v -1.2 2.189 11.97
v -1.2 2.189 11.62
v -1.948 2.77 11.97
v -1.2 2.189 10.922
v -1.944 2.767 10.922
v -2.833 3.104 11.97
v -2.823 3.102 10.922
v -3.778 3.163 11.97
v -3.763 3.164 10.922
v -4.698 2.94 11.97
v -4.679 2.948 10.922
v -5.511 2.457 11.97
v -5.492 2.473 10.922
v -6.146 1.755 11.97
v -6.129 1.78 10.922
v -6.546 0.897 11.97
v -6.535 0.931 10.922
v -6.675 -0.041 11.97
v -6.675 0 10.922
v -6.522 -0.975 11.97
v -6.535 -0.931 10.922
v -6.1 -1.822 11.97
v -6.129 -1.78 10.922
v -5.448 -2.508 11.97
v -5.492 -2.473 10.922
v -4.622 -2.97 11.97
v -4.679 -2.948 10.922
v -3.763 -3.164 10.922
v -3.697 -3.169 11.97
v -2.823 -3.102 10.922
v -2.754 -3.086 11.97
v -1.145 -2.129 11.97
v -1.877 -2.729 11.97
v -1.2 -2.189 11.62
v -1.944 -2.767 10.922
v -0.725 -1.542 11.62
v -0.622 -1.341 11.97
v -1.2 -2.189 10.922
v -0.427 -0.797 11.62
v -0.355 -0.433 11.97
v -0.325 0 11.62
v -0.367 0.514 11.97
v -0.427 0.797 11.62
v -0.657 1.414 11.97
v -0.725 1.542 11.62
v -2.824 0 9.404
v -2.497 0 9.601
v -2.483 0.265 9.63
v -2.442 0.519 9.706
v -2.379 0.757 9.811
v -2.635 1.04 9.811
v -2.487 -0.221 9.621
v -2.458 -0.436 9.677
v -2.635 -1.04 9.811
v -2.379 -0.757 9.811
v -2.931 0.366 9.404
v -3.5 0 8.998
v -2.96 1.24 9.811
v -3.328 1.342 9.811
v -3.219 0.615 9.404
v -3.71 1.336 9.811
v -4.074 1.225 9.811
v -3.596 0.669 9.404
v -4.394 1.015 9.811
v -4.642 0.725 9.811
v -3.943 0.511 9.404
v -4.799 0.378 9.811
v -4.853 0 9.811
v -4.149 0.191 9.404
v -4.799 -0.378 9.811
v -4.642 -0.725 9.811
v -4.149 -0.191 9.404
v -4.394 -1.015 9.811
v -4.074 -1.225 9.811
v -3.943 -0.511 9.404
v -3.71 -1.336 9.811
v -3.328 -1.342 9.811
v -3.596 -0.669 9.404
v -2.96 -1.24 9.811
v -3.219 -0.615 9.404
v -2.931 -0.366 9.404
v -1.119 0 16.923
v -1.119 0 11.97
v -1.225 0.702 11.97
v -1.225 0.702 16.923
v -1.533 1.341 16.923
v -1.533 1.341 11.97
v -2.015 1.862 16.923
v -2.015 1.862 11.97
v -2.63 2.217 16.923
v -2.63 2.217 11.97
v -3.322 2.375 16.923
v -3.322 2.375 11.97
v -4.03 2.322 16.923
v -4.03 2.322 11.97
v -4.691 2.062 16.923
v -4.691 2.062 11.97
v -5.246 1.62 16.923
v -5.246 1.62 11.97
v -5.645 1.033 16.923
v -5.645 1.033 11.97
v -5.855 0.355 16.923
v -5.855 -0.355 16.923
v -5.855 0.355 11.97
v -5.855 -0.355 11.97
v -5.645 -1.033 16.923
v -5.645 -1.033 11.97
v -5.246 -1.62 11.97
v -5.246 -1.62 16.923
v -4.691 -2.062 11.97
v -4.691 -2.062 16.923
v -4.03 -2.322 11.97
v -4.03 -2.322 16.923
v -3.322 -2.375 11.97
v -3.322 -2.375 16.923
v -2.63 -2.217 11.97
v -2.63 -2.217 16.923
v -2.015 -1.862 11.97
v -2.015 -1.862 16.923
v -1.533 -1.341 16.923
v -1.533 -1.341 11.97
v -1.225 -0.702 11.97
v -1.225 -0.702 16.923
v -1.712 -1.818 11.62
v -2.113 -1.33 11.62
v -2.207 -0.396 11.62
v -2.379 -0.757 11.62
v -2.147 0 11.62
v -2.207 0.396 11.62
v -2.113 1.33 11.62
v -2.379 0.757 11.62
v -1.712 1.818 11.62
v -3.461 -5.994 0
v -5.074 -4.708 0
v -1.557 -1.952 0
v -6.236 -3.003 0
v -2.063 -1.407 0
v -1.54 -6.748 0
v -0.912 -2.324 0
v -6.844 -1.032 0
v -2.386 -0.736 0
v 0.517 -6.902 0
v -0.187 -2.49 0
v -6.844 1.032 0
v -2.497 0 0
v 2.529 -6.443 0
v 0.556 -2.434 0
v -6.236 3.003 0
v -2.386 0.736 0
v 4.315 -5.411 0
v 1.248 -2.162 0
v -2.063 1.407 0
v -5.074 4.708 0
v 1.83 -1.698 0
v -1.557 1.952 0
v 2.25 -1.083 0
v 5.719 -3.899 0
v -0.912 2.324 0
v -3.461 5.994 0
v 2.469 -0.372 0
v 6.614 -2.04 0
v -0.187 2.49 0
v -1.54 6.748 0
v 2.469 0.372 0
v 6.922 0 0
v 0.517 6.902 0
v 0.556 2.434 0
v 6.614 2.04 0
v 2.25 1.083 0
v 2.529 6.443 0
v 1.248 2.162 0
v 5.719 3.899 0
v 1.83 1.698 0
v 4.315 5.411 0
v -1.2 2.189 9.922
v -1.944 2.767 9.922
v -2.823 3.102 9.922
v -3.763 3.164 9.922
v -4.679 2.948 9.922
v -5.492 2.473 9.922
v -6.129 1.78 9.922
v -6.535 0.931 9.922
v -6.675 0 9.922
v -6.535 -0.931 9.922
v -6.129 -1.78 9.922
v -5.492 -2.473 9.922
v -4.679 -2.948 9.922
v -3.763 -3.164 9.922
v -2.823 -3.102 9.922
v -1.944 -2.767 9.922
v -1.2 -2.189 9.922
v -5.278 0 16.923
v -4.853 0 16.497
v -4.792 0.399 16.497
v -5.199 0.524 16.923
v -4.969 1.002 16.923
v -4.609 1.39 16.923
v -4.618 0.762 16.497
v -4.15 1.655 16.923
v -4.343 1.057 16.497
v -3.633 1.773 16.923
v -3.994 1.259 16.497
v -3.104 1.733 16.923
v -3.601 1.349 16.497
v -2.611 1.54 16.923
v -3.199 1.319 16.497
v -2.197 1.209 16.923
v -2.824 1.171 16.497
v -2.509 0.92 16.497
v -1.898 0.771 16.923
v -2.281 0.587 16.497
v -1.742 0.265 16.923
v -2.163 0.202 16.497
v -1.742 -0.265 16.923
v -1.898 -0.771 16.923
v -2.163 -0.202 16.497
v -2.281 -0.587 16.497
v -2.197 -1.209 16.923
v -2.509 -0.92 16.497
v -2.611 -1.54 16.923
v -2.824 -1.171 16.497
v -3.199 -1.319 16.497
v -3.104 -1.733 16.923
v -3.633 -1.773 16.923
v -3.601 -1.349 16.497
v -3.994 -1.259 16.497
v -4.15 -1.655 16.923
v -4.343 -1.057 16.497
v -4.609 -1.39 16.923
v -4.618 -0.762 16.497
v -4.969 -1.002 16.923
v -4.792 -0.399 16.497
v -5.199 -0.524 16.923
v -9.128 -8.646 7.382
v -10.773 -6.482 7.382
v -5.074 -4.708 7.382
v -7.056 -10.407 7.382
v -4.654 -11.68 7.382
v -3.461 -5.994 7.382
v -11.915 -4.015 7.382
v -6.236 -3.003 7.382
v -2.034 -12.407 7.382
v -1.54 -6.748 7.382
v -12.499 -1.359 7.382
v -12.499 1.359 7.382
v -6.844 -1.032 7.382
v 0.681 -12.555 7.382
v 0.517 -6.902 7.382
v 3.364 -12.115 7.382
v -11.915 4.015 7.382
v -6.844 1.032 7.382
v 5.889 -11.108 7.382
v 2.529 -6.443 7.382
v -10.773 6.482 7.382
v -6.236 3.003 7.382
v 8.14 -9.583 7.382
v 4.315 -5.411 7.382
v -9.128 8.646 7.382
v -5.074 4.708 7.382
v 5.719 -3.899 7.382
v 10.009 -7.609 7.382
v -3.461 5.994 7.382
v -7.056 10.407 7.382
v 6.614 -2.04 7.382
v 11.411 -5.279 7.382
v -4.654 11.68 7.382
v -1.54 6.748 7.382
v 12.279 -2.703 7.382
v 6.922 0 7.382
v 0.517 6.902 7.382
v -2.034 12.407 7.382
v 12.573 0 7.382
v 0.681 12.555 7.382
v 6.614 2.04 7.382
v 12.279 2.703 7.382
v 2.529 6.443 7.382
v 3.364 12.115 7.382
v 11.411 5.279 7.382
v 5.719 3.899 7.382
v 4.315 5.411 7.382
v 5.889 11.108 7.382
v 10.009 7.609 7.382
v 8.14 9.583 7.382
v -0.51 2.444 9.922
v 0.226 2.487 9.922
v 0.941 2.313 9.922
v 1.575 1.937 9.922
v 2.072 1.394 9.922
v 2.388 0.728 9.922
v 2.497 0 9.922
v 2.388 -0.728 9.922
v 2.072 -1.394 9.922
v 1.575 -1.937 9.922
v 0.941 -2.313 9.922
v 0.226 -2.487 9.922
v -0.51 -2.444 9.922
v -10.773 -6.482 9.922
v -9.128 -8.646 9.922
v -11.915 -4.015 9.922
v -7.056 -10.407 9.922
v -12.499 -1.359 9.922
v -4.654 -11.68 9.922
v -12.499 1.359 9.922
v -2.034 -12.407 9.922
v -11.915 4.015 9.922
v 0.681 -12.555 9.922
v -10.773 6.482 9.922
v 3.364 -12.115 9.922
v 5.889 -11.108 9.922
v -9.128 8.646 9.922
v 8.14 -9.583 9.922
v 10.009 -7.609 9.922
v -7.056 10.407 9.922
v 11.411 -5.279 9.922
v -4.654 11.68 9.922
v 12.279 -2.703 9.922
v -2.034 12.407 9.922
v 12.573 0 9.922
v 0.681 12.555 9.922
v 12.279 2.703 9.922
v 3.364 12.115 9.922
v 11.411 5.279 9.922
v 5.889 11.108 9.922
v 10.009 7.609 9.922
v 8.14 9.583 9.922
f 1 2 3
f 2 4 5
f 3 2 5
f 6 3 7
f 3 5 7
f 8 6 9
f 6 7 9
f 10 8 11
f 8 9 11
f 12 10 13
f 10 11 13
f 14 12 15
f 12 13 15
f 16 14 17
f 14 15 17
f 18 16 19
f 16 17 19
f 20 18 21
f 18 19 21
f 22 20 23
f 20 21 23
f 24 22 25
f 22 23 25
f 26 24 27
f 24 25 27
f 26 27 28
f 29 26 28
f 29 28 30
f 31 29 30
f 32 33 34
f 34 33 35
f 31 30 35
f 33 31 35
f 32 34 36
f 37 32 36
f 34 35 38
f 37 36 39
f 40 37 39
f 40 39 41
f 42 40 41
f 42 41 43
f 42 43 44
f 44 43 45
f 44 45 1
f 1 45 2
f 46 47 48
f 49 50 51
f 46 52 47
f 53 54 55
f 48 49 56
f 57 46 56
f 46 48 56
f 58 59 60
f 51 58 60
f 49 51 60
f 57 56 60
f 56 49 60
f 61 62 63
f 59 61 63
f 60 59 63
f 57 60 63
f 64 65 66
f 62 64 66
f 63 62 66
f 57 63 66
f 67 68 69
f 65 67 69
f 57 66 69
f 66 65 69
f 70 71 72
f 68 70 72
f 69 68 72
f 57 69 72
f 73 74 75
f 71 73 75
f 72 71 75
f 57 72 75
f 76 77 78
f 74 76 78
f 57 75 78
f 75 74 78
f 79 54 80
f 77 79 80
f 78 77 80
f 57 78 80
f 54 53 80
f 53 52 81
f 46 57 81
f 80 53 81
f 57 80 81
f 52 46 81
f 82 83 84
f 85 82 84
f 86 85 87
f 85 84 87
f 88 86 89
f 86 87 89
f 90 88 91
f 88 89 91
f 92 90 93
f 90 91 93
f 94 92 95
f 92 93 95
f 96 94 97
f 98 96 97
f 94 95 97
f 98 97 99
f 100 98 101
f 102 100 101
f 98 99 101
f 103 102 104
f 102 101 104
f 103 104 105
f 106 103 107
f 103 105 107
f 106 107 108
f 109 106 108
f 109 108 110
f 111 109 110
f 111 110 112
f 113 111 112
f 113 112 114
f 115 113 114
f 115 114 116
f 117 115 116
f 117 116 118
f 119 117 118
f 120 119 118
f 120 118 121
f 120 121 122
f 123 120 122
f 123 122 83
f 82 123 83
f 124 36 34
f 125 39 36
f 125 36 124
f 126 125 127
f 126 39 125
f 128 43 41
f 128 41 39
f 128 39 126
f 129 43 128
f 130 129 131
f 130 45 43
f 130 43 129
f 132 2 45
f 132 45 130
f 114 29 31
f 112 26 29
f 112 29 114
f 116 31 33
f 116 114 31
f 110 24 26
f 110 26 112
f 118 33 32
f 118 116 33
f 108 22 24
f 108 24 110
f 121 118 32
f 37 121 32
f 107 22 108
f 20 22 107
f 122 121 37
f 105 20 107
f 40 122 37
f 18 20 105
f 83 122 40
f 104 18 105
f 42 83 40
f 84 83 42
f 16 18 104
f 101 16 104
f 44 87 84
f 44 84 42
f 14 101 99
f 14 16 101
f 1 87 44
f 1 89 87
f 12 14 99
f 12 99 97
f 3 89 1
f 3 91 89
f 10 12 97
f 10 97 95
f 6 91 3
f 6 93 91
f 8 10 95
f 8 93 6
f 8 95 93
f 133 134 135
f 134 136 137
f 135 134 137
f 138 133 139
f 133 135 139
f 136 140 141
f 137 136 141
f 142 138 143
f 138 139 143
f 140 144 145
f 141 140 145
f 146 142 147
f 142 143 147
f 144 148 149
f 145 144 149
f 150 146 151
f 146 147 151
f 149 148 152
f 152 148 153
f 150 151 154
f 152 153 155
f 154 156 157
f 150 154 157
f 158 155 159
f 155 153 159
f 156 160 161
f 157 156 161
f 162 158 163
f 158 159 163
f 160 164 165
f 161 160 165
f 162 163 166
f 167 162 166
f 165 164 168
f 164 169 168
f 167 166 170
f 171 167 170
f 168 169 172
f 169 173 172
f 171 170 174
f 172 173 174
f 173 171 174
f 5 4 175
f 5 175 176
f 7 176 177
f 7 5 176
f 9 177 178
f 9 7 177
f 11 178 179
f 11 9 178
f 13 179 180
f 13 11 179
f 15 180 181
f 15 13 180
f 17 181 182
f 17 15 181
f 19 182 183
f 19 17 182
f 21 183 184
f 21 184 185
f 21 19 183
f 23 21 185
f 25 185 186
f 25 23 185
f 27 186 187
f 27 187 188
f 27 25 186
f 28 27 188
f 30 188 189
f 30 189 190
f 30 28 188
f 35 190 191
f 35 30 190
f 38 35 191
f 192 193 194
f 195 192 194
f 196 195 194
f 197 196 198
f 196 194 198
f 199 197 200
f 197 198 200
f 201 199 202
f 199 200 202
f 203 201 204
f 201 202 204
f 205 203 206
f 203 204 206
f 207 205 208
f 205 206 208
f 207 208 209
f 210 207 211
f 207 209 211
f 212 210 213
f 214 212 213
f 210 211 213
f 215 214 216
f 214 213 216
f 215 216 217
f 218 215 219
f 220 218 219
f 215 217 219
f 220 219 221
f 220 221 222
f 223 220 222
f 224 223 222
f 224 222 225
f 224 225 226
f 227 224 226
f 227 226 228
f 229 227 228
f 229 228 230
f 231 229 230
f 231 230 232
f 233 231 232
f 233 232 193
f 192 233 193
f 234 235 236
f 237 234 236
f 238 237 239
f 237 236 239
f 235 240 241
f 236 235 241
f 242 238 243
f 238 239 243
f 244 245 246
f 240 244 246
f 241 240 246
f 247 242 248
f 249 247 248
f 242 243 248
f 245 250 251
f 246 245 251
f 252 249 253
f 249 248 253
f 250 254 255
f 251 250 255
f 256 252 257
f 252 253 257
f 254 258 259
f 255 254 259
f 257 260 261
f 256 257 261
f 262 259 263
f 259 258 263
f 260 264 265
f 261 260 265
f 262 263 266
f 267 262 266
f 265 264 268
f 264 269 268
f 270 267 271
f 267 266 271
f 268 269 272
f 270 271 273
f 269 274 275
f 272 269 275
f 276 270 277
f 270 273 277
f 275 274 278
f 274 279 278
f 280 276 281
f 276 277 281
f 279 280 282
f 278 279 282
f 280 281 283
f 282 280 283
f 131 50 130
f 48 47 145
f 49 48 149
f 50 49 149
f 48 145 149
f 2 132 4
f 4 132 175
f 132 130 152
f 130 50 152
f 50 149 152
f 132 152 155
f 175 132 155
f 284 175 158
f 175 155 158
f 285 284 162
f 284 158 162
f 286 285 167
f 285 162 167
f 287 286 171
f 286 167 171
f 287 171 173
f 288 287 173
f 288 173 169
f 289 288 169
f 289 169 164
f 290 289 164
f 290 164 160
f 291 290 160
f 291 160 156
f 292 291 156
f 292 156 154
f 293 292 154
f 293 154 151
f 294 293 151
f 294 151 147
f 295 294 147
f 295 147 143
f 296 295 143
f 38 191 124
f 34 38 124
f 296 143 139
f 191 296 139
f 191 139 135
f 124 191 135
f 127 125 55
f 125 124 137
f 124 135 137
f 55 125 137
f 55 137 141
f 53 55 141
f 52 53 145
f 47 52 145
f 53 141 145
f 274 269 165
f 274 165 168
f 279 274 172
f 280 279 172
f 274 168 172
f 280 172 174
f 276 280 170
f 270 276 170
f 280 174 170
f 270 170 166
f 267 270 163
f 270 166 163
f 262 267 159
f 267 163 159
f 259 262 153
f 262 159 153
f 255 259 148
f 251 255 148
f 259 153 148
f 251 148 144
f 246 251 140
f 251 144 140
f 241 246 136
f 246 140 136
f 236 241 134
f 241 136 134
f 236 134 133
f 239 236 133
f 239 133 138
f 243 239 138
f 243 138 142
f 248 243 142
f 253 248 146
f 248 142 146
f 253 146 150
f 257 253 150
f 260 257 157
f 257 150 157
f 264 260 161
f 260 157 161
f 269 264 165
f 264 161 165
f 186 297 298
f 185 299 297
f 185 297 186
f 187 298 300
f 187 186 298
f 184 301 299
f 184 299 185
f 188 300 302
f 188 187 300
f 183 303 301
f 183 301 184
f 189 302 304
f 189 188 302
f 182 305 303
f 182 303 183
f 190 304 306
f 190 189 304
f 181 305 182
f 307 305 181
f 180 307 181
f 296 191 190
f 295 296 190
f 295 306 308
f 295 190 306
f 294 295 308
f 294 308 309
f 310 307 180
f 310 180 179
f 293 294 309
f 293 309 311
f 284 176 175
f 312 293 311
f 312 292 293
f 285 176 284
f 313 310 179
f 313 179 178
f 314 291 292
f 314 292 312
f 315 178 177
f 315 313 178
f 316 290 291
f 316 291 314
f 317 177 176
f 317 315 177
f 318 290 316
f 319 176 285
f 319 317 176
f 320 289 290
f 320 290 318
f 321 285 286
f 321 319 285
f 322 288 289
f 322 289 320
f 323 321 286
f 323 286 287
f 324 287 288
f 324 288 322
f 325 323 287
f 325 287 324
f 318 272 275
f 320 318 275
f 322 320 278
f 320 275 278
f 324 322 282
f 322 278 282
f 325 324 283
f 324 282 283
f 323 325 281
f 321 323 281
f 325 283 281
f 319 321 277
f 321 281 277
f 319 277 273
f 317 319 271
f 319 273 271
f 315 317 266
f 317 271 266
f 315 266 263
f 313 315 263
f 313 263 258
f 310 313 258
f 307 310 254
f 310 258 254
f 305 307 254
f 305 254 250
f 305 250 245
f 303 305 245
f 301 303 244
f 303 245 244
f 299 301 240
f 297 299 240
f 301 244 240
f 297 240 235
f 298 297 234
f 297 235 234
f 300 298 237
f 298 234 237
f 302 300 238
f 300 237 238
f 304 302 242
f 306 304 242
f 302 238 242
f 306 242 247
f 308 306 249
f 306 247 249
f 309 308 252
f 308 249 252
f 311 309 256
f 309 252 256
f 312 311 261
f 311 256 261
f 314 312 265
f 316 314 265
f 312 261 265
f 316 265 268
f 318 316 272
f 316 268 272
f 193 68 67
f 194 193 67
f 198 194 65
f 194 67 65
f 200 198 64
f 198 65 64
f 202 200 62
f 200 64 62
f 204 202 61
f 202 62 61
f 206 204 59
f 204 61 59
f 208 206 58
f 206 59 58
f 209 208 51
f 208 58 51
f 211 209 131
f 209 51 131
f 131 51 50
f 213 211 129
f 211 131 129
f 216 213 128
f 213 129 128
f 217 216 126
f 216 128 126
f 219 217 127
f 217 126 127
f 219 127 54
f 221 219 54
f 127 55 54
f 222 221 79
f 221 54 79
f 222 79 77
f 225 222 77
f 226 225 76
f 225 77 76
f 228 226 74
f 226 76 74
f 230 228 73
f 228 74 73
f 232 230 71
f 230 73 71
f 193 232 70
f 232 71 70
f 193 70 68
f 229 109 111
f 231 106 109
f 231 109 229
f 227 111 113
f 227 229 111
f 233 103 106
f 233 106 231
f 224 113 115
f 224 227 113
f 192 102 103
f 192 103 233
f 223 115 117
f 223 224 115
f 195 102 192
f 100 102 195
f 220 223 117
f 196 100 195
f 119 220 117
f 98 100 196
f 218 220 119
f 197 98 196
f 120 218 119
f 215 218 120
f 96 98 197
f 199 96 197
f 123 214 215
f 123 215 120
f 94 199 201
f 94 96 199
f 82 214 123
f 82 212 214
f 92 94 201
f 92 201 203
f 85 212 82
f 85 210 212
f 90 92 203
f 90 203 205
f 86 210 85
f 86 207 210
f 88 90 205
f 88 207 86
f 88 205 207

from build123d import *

# Parameters (mm, degrees)
SKETCH1_R                       = 6.9215
SKETCH1_R_2                     = 0.127
BOSS_EXTRUDE1_DEPTH             = 10.922
SKETCH2_R                       = 2.38125
BOSS_EXTRUDE2_DEPTH             = 6.00075
BOSS_EXTRUDE3_START             = -0.762
SKETCH4_R                       = 6.9215
BOSS_EXTRUDE3_DEPTH             = 0.762
SKETCH5_R                       = 3.175
BOSS_EXTRUDE4_DEPTH             = 1.04775
F_6_32_TAPPED_HOLE1_D           = 2.7051
F_6_32_TAPPED_HOLE1_DEPTH       = 7.112
F_6_32_TAPPED_HOLE1_CSINK_D     = 3.556
F_6_32_TAPPED_HOLE1_CSINK_ANGLE = 90
F_6_32_TAPPED_HOLE1_TIP         = 0.81269403
SKETCH9_R                       = 0.127
CUT_EXTRUDE2_DEPTH              = 15.108150995
SKETCH13_R                      = 2.49682
CUT_EXTRUDE5_DEPTH              = 11.6205
SKETCH15_OUTSIDE_W              = 21.02
SKETCH15_OUTSIDE_H              = 21.02
SKETCH15_OUTSIDE_R              = 3.175
CUT_EXTRUDE7_DEPTH              = 1.000000032
BOSS_EXTRUDE6_START             = -2.54
SKETCH16_R                      = 12.573
SKETCH16_R_2                    = 6.9215
BOSS_EXTRUDE6_DEPTH             = 2.54


with BuildPart() as part:
    # Sketch1 → Boss-Extrude1 (new body)
    with BuildSketch(Plane.XY):
        Circle(SKETCH1_R)
        Circle(SKETCH1_R_2, mode=Mode.SUBTRACT)
    extrude(amount=BOSS_EXTRUDE1_DEPTH)

    # Sketch2 → Boss-Extrude2 (add)
    with BuildSketch(Plane.XY.offset(10.922)):
        with Locations((-3.5, 0)):
            Circle(SKETCH2_R)
    extrude(amount=BOSS_EXTRUDE2_DEPTH)

    # Sketch4 → Boss-Extrude3 (add)
    with BuildSketch(Plane.XY.offset(10.922).offset(BOSS_EXTRUDE3_START)):
        Circle(SKETCH4_R)
    extrude(amount=BOSS_EXTRUDE3_DEPTH)

    # Sketch5 → Boss-Extrude4 (add)
    with BuildSketch(Plane.XY.offset(10.922)):
        with Locations(Location((-3.5, 0, 0), (0, 0, 43.593288384))):
            Circle(SKETCH5_R)
    extrude(amount=BOSS_EXTRUDE4_DEPTH)

    # #6-32 Tapped Hole1
    with Locations(Plane.XY.offset(16.92275)):
        with Locations((-3.5, 0)):
            CounterSinkHole(F_6_32_TAPPED_HOLE1_D / 2, F_6_32_TAPPED_HOLE1_CSINK_D / 2, depth=F_6_32_TAPPED_HOLE1_DEPTH, counter_sink_angle=F_6_32_TAPPED_HOLE1_CSINK_ANGLE)
            with Locations((0, 0, -(F_6_32_TAPPED_HOLE1_DEPTH + F_6_32_TAPPED_HOLE1_TIP / 2))):  # 118° drill point
                Cone(0, F_6_32_TAPPED_HOLE1_D / 2, F_6_32_TAPPED_HOLE1_TIP, mode=Mode.SUBTRACT)

    # Sketch9 → Cut-Extrude2 (cut, through all)
    with BuildSketch(Plane(origin=(0, 0, 10.16), x_dir=(-1, 0, 0), z_dir=(0, 0, -1))):
        Circle(SKETCH9_R)
    extrude(amount=-CUT_EXTRUDE2_DEPTH, mode=Mode.SUBTRACT)

    # Sketch13 → Cut-Extrude5 (cut)
    with BuildSketch(Plane(origin=(0, 0, 0), x_dir=(-1, 0, 0), z_dir=(0, 0, -1))):
        Circle(SKETCH13_R)
    extrude(amount=-CUT_EXTRUDE5_DEPTH, mode=Mode.SUBTRACT)

    # Sketch15 outside → Cut-Extrude7 (cut)
    with BuildSketch(Plane.XY.offset(10.922)):
        Rectangle(SKETCH15_OUTSIDE_W, SKETCH15_OUTSIDE_H)
        with Locations(Location((-3.5, 0, 0), (0, 0, 43.593288384))):
            Circle(SKETCH15_OUTSIDE_R, mode=Mode.SUBTRACT)
    extrude(amount=-CUT_EXTRUDE7_DEPTH, mode=Mode.SUBTRACT)

    # Sketch16 → Boss-Extrude6 (add)
    with BuildSketch(Plane.XY.offset(9.921999968).offset(BOSS_EXTRUDE6_START)):
        Circle(SKETCH16_R)
        Circle(SKETCH16_R_2, mode=Mode.SUBTRACT)
    extrude(amount=BOSS_EXTRUDE6_DEPTH)


solid = part.part
